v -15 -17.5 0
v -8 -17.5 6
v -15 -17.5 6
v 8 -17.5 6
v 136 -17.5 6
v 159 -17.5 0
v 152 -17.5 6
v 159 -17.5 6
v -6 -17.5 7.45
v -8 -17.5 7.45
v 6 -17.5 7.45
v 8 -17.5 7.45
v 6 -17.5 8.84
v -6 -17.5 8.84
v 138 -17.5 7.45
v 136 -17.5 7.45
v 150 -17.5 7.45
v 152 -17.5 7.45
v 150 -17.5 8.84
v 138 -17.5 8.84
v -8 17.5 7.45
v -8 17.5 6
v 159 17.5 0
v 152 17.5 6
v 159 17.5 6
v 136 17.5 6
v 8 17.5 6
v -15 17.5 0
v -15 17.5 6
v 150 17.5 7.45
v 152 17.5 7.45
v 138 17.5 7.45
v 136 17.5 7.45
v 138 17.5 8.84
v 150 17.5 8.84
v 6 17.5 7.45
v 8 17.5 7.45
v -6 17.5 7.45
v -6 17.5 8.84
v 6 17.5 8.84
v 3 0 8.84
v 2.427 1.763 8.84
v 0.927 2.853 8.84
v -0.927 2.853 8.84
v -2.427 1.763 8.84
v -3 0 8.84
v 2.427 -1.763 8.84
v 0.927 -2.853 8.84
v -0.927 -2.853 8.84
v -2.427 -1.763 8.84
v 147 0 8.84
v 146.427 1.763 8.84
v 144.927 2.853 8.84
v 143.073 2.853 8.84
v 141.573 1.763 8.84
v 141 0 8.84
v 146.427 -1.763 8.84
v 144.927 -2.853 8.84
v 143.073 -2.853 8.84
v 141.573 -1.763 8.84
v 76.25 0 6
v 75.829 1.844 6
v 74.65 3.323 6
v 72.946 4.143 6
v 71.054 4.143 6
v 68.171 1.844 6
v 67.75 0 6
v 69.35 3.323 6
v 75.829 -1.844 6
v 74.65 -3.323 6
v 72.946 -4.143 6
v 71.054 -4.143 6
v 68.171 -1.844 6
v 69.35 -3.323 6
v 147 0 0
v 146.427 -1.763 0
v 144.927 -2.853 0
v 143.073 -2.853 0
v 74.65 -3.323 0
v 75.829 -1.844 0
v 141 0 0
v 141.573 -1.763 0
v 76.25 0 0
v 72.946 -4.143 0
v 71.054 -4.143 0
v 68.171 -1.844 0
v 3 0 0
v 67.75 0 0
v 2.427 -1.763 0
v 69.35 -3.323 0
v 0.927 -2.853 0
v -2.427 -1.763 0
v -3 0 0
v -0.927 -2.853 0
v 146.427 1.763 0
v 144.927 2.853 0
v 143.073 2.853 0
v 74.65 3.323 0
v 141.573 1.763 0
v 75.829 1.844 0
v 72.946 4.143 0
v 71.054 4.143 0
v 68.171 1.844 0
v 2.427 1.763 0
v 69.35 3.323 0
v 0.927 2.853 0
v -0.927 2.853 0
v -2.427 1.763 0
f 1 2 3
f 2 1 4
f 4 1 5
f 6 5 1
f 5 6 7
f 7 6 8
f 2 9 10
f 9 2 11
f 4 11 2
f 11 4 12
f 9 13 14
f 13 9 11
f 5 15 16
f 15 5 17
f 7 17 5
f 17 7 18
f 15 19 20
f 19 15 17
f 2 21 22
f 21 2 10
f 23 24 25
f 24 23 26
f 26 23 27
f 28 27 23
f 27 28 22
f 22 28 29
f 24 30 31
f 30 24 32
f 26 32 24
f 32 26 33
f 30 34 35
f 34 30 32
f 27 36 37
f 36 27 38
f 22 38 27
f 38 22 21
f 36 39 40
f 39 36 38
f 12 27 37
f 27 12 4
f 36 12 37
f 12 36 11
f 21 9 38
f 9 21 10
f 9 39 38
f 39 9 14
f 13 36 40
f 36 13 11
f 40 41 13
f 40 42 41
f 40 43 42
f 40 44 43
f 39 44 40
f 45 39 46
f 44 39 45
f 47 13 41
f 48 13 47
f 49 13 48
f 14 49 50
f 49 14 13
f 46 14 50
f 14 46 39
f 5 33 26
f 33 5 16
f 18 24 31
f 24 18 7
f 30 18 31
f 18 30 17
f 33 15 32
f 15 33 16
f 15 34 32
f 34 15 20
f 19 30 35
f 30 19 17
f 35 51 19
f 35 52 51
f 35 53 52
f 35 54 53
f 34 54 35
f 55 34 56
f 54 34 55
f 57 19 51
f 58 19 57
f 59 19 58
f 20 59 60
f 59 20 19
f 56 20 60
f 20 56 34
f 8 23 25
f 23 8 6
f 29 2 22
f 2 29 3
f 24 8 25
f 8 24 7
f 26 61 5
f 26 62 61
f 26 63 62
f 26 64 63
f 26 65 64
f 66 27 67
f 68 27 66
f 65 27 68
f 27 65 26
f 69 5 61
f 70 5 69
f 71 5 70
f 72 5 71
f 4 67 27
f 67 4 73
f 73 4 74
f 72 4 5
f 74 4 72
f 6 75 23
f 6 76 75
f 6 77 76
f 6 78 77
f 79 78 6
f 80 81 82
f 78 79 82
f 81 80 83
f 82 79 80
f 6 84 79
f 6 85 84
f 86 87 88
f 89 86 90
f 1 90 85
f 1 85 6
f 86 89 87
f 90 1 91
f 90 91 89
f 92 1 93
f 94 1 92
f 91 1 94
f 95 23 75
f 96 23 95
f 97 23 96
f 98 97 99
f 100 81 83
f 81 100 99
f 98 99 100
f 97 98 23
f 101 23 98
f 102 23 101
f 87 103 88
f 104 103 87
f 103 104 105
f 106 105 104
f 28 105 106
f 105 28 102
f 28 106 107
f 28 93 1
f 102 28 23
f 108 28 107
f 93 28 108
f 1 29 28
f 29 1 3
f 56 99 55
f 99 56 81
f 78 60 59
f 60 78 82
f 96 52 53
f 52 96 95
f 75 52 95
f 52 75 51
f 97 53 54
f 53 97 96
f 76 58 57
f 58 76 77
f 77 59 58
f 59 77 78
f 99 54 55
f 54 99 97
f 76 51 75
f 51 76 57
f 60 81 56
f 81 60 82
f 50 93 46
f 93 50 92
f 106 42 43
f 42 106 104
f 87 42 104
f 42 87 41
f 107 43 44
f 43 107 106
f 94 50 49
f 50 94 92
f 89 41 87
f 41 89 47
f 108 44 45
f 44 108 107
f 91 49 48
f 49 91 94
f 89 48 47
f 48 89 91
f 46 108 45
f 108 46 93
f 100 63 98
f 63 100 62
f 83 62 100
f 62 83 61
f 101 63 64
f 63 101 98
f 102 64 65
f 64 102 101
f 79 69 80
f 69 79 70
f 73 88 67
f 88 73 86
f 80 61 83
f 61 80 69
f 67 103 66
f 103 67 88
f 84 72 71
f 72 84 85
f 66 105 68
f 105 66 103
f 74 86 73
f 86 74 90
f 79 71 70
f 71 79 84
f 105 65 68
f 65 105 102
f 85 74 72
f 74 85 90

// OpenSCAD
// file: includes/k8200_rail.scad
module k8200_rail(){
    union(){
        linear_extrude(rlen)translate([0,-0.7,0])square([16,1.5],center=true);
        linear_extrude(rlen)translate([0,-2.09,0])square([12,1.5],center=true);
    }
}
//k8200_rail(rlen=20);
// main file
x=174;
y=35;
z=6;
dpp=144;

include <includes/k8200_rail.scad>;

difference(){
    union(){
    translate([-15,-y/2,0])cube([x,y,z]);
    translate([0,-y/2,z])rotate([-90,0,0])k8200_rail(rlen=y);
    translate([dpp,-y/2,z])rotate([-90,0,0])k8200_rail(rlen=y);
    }
union(){
    translate([dpp,0,-1])cylinder(d=6,h=10);
    translate([0,0,-1])cylinder(d=6,h=10);
    translate([dpp/2,0,-1])cylinder(d=8.5,h=10);
}
}
